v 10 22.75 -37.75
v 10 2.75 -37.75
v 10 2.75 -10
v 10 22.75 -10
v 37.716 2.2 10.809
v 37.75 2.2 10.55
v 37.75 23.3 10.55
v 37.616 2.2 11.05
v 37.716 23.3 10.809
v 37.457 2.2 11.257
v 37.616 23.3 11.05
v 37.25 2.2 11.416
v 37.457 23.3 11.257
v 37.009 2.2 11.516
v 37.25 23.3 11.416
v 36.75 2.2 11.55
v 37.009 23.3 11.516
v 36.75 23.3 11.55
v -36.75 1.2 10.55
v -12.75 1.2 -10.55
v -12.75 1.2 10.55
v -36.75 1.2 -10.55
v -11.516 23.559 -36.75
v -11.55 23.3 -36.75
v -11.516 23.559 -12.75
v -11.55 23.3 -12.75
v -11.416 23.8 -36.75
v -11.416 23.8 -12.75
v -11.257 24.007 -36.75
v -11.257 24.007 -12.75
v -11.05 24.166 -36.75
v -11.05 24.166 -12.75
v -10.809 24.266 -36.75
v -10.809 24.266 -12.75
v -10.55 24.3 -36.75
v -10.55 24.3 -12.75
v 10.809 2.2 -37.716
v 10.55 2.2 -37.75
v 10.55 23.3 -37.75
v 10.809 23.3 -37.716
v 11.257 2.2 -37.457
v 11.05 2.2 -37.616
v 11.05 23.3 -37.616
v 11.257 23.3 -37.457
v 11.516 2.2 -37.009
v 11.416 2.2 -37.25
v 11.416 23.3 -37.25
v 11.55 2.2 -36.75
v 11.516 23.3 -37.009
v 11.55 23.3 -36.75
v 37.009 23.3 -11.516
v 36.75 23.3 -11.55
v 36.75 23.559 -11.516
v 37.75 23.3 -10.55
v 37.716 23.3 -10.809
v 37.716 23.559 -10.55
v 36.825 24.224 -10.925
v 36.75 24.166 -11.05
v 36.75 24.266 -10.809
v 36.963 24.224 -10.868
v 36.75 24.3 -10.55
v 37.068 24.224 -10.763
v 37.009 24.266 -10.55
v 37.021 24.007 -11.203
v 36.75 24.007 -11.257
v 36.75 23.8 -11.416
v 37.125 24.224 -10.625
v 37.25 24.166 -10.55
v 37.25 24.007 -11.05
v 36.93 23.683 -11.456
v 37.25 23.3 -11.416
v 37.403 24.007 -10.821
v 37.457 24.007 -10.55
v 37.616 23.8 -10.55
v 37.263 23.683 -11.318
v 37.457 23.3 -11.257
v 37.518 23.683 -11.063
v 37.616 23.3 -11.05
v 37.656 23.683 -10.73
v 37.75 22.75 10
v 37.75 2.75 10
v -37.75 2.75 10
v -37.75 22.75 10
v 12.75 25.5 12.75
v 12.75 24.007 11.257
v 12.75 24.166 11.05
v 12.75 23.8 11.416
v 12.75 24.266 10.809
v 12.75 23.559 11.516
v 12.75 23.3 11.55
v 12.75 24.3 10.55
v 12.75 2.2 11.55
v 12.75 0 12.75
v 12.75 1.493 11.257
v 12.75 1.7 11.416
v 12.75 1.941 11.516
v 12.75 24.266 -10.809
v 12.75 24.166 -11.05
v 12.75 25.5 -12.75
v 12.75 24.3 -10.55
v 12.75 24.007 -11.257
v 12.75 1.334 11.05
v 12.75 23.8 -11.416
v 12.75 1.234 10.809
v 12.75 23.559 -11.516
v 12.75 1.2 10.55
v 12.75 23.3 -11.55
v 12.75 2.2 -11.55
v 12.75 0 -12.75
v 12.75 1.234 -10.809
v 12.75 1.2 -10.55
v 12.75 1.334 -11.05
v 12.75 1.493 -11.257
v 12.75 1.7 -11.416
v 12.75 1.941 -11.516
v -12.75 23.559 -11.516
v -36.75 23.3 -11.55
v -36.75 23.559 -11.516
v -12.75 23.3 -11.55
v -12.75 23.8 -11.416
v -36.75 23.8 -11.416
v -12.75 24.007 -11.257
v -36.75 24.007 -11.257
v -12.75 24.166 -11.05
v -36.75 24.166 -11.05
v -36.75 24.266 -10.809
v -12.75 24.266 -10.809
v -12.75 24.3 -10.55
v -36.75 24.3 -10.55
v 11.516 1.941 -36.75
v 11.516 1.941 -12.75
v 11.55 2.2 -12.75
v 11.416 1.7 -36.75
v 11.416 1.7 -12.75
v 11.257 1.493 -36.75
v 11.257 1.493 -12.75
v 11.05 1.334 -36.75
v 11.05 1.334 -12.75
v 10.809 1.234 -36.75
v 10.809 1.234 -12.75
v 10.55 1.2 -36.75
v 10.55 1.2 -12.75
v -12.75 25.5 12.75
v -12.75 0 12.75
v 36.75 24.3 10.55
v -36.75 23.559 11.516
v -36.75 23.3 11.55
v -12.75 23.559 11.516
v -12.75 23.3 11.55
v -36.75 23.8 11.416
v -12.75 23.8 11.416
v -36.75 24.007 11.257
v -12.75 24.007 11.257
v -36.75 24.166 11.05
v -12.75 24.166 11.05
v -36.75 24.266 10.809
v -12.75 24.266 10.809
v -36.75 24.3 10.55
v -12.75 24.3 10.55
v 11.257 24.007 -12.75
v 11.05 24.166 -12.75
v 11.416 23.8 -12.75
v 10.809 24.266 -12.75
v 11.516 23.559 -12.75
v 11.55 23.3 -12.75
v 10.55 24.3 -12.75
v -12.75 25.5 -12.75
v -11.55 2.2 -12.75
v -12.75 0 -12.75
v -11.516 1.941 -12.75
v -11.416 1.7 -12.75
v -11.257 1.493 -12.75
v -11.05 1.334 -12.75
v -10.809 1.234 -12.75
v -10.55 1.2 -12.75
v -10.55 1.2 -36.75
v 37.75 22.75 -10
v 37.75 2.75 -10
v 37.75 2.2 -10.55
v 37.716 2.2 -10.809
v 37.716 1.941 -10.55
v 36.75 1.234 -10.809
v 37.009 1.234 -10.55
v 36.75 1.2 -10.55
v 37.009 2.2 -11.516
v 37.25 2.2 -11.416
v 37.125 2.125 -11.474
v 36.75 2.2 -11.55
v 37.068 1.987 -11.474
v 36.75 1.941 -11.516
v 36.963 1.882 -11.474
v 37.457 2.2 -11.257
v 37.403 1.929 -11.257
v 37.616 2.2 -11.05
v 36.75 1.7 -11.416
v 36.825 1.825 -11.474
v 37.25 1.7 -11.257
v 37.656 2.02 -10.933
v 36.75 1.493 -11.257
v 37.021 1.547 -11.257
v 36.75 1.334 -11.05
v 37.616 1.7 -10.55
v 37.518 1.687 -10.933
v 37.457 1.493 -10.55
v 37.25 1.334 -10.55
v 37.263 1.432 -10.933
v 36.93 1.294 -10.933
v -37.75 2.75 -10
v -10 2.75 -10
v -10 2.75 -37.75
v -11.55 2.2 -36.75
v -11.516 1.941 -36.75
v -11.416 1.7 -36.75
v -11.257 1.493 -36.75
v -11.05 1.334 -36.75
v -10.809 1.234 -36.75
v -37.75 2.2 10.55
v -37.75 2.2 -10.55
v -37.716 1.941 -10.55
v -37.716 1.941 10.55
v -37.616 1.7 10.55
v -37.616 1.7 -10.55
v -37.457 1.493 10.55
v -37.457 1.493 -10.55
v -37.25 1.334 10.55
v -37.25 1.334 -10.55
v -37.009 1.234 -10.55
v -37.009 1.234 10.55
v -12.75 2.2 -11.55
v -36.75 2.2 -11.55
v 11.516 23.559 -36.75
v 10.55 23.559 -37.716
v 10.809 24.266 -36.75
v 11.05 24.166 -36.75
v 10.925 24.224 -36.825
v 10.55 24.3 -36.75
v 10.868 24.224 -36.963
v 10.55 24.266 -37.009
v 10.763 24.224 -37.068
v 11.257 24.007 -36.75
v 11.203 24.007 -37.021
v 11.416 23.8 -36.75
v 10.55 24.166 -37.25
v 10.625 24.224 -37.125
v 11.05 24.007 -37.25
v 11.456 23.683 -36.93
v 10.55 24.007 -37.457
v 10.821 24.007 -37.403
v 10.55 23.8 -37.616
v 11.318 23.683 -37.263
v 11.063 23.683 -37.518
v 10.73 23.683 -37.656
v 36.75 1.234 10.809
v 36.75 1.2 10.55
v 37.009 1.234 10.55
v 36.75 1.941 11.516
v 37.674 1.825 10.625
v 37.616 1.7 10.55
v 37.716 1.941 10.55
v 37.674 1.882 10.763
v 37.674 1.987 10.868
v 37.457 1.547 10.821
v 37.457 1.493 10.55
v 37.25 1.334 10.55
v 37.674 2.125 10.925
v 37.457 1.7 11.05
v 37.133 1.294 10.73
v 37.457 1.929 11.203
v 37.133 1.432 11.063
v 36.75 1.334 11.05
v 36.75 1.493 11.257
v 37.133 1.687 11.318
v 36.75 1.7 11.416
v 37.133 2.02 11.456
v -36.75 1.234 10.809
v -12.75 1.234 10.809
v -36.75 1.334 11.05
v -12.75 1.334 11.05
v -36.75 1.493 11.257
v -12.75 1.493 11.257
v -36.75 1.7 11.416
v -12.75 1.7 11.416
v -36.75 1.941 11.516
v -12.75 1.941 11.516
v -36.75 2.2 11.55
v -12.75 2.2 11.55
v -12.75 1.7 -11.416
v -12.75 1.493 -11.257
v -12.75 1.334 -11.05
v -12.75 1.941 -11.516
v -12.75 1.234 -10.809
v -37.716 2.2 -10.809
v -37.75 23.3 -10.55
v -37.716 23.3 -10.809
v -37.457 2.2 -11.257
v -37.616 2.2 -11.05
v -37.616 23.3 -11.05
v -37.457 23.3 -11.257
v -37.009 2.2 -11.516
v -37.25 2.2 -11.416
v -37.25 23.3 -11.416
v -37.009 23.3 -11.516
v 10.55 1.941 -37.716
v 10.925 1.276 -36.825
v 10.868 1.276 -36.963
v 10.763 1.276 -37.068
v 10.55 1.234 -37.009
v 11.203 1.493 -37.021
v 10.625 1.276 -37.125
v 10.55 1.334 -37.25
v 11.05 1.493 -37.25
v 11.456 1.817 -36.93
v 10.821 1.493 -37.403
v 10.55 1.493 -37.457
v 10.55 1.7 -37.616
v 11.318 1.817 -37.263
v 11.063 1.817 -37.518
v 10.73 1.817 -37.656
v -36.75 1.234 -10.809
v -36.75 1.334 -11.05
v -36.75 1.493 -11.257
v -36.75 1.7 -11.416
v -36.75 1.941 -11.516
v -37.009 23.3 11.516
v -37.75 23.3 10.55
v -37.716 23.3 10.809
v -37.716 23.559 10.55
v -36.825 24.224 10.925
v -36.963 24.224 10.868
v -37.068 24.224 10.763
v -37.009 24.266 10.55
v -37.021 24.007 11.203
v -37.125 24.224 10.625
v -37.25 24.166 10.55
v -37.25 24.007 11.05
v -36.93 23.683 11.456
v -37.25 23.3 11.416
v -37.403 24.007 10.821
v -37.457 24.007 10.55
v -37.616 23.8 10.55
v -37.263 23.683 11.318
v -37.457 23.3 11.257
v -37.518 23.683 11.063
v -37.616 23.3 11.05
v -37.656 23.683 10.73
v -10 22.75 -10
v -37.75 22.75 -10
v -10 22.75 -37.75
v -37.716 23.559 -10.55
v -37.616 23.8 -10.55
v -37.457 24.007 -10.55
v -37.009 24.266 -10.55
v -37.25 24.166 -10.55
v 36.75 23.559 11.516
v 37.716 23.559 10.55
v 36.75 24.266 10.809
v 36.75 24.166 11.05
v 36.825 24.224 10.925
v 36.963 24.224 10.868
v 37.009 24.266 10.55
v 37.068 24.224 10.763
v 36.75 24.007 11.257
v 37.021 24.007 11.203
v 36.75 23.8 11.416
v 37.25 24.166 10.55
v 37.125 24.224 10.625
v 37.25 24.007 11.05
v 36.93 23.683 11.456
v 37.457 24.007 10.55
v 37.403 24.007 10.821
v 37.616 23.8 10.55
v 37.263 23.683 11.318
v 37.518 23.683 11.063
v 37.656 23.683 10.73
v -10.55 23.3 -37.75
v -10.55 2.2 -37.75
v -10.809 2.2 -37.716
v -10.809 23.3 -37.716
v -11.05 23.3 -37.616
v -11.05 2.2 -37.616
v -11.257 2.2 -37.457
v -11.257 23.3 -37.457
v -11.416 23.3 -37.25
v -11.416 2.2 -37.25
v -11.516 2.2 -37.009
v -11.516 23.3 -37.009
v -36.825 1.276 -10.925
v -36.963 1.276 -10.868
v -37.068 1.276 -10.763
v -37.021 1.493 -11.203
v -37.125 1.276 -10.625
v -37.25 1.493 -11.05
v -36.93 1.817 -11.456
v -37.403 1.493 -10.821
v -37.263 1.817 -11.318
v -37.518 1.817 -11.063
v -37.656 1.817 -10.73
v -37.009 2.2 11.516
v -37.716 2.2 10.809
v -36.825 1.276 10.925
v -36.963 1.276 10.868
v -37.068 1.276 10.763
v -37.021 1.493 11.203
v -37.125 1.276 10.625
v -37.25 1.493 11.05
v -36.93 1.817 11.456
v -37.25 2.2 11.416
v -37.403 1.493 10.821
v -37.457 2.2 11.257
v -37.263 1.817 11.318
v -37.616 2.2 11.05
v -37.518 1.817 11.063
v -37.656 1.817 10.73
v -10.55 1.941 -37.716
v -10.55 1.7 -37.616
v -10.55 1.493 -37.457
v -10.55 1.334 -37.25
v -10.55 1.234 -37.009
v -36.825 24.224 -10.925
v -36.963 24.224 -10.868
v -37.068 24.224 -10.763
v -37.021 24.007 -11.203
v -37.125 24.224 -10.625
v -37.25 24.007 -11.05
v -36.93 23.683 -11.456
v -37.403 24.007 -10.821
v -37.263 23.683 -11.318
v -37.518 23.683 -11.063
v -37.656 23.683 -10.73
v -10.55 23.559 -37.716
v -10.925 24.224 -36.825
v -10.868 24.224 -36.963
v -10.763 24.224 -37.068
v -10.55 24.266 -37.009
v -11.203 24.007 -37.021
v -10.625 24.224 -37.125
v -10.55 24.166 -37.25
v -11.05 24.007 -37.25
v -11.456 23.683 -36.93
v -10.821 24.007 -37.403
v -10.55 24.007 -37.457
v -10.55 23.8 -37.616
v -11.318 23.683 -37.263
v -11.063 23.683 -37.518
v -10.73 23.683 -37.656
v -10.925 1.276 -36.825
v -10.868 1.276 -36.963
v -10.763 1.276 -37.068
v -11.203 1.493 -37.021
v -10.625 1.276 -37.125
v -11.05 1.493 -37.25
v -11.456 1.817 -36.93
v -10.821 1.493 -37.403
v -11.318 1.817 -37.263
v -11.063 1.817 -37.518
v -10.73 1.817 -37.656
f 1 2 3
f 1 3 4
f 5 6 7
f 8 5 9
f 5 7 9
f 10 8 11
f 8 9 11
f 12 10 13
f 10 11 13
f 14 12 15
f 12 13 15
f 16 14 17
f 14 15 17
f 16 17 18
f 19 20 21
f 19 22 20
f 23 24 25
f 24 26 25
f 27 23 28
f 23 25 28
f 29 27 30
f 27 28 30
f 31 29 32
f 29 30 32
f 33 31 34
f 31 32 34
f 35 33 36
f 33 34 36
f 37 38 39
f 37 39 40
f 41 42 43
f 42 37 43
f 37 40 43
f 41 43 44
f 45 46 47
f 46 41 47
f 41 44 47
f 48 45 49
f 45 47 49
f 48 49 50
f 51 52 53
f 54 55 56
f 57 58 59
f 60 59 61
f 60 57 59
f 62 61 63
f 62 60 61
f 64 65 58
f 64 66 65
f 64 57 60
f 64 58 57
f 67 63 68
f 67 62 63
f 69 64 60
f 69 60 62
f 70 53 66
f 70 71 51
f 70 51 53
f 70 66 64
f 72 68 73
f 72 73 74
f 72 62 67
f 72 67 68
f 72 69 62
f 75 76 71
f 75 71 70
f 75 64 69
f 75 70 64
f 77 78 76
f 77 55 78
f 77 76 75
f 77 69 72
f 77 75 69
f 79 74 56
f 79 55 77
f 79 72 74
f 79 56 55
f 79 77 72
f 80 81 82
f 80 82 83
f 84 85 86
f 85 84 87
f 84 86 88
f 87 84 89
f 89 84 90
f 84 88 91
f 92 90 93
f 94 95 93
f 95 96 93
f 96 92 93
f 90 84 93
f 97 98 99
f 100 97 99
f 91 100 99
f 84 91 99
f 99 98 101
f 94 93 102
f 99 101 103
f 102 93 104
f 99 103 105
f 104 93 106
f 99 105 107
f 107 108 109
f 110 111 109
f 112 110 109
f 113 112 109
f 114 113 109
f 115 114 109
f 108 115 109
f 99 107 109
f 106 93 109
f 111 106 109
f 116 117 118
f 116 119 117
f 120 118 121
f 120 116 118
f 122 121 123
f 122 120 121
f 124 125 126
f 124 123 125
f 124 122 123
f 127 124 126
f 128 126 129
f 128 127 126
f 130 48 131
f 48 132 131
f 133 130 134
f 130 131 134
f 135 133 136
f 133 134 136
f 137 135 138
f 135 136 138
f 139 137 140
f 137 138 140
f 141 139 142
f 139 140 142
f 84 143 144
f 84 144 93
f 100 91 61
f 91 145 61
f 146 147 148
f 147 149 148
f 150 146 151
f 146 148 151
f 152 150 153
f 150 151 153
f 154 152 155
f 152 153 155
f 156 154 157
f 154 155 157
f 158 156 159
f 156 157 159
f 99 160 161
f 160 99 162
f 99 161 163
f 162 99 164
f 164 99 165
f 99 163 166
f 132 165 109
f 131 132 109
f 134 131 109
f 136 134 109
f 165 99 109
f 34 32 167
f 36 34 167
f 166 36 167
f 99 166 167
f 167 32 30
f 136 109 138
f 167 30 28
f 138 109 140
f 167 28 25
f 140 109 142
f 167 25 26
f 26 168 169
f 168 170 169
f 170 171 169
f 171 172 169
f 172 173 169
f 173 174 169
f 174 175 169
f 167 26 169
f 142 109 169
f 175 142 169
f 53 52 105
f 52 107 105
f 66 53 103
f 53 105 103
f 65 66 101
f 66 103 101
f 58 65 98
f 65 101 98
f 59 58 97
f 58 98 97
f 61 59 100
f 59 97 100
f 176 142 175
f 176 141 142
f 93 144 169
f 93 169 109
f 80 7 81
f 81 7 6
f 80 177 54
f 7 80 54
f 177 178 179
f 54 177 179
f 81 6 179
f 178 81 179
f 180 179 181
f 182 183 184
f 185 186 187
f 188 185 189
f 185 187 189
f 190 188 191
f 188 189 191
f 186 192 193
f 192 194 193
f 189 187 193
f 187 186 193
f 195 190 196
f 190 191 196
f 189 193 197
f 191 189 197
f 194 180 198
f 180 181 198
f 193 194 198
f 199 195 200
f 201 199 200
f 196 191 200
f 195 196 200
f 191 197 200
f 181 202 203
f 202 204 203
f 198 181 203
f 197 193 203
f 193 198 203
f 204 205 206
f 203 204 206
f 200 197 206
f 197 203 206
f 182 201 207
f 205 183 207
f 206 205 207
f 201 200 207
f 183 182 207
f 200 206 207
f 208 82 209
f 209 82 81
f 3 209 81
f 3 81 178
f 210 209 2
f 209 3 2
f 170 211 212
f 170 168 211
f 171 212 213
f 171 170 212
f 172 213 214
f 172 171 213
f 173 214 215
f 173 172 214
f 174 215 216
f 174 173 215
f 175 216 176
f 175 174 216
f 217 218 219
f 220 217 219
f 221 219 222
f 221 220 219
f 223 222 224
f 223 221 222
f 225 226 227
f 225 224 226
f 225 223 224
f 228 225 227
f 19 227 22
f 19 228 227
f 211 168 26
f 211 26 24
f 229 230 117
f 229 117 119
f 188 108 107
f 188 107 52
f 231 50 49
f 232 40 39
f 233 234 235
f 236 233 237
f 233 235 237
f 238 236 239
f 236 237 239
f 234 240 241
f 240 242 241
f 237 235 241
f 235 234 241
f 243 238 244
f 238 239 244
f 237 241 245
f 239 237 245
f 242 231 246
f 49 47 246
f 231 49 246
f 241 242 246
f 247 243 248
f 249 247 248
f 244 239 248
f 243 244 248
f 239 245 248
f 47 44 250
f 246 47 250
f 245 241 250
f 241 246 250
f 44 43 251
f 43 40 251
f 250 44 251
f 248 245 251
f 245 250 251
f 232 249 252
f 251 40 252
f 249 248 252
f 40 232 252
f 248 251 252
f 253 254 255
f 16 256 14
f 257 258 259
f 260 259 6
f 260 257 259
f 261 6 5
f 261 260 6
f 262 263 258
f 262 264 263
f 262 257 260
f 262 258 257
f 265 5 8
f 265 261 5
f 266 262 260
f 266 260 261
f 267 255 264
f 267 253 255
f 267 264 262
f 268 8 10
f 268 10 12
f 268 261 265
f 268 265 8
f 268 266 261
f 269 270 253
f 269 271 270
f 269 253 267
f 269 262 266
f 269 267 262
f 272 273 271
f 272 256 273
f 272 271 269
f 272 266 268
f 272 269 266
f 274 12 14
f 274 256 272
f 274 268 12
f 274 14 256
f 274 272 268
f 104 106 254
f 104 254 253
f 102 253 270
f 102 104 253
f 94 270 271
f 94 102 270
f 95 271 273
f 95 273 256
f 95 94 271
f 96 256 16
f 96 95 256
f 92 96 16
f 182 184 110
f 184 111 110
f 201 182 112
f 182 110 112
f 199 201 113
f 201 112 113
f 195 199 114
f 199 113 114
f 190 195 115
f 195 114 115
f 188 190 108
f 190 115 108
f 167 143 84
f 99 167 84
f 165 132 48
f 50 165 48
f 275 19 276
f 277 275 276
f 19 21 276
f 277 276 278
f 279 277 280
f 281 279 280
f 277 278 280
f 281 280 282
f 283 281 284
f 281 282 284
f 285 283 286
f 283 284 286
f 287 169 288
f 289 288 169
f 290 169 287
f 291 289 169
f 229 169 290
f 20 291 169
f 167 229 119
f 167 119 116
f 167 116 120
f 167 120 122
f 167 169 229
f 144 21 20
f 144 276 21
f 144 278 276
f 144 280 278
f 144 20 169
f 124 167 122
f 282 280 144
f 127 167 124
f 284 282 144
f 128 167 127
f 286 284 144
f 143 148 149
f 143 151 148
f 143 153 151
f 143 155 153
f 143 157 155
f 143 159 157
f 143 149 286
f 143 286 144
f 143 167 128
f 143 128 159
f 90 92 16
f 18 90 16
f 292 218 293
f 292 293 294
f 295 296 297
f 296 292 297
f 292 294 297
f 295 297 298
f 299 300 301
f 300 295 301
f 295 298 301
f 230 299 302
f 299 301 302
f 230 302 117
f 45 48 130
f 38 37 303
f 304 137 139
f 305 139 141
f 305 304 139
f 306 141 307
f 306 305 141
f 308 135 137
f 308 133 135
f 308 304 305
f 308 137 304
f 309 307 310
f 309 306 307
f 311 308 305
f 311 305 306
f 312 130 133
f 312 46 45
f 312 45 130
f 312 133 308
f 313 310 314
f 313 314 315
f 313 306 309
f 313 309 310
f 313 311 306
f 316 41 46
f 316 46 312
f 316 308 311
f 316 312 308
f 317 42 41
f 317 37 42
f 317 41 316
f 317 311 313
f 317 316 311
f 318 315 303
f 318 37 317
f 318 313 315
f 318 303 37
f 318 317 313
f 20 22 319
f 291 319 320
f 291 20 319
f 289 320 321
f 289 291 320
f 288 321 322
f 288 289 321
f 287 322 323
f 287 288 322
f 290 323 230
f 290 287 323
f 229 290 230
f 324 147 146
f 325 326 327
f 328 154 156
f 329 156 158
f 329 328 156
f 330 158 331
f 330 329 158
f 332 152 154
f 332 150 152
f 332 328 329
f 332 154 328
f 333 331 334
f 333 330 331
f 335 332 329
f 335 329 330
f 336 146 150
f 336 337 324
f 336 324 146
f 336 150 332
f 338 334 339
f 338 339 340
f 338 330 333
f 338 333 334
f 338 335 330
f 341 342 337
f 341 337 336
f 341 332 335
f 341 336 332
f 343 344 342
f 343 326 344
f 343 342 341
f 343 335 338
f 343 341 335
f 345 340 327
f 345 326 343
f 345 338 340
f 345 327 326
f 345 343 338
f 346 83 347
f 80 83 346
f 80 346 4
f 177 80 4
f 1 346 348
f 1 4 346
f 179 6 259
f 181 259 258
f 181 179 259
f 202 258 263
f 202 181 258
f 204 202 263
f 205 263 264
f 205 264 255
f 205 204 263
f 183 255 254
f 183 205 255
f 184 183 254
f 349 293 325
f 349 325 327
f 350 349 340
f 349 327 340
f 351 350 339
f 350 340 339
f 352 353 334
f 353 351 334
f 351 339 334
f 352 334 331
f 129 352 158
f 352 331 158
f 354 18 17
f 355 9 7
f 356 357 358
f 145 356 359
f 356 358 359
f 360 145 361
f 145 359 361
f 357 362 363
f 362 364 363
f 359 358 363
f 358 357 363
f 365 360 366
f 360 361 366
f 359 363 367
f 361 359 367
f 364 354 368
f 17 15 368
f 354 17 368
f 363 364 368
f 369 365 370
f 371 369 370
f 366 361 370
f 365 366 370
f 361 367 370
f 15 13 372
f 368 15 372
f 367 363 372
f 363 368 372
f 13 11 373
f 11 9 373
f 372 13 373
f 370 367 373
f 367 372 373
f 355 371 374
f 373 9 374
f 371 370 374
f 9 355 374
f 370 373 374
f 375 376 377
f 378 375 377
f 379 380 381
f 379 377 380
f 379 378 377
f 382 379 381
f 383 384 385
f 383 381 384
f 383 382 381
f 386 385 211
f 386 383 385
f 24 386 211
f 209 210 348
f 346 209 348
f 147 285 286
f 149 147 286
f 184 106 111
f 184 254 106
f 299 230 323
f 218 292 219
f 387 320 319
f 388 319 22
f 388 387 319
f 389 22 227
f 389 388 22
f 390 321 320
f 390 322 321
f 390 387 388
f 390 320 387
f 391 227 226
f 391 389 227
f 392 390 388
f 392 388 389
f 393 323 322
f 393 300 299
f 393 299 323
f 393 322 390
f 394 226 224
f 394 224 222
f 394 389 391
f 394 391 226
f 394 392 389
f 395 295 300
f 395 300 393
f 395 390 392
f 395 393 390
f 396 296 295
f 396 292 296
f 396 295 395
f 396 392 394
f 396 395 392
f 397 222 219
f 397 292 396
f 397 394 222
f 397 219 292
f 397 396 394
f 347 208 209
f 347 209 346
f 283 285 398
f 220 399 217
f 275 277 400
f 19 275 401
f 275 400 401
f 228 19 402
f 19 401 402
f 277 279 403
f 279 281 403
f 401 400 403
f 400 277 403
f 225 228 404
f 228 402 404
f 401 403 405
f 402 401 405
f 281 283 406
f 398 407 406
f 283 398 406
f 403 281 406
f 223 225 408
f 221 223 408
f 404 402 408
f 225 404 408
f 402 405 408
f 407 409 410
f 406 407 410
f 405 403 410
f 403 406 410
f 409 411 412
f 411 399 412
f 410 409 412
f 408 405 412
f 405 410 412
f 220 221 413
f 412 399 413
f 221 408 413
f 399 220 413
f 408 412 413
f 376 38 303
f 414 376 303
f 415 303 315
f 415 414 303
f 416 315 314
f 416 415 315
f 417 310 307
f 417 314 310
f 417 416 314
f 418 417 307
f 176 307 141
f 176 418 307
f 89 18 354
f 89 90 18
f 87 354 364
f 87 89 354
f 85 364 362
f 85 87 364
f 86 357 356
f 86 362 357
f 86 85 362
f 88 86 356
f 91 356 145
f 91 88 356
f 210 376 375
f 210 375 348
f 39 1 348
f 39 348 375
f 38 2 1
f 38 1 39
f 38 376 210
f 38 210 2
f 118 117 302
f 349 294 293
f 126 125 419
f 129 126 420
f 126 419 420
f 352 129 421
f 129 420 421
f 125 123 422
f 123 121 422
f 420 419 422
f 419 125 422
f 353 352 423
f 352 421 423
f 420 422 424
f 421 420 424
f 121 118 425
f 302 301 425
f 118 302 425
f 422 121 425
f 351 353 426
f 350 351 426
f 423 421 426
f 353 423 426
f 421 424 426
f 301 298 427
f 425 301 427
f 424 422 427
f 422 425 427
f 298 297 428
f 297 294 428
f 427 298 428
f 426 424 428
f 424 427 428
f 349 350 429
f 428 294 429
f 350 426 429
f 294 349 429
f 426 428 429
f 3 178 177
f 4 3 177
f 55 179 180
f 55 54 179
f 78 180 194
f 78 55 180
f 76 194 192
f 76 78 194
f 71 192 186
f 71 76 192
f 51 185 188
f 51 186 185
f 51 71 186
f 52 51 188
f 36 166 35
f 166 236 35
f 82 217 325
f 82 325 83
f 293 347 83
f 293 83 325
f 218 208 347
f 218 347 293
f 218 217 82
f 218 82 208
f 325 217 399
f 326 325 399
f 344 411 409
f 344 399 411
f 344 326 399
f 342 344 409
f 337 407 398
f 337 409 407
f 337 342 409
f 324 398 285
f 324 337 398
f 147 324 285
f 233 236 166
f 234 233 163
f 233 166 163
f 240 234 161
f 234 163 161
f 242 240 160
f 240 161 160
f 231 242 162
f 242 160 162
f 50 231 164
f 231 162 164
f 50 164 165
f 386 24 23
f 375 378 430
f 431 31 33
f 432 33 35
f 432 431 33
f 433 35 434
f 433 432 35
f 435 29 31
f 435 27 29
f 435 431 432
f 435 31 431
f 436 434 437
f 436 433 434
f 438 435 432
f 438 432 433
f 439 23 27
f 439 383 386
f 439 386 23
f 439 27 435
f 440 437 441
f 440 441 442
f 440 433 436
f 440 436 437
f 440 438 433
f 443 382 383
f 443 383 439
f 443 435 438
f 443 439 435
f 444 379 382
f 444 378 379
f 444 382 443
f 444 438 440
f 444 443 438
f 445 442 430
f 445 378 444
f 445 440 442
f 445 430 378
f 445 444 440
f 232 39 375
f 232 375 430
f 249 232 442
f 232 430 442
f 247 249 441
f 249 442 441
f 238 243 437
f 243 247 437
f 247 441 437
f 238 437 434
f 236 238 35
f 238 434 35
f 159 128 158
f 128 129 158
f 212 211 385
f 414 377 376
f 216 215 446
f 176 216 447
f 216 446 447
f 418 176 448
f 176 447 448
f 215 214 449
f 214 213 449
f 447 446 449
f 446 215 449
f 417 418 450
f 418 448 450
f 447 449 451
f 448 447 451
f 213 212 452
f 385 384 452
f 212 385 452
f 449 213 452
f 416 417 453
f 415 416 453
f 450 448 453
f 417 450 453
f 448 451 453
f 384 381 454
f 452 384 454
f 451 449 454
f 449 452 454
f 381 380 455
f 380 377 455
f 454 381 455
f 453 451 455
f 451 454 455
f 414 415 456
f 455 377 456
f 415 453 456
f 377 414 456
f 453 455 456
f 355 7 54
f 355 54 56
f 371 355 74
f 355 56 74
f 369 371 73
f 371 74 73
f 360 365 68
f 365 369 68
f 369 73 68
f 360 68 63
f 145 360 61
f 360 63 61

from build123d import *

# Parameters (mm, degrees)
SKETCH1_W           = 25
SKETCH1_H           = 23.1
SKETCH1_W_2         = 23.1
SKETCH1_H_2         = 25
BOSS_EXTRUDE2_DEPTH = 25.5
SKETCH2_W           = 23.1
SKETCH2_H           = 1.2
CUT_EXTRUDE1_DEPTH  = 25
SKETCH3_W           = 23.1
SKETCH3_H           = 1.2
CUT_EXTRUDE2_DEPTH  = 25
SKETCH4_W           = 23.1
SKETCH4_H           = 1.2
CUT_EXTRUDE3_DEPTH  = 25
SKETCH5_W           = 20
SKETCH5_H           = 20
CUT_EXTRUDE4_DEPTH  = 76.5
SKETCH8_W           = 20
SKETCH8_H           = 20
CUT_EXTRUDE5_DEPTH  = 30
FILLET1_R           = 1


with BuildPart() as part:
    # Sketch1 → Boss-Extrude2 (new body)
    with BuildSketch(Plane(origin=(0, 0, 0), x_dir=(1, 0, 0), z_dir=(0, 1, 0))):
        with Locations((-25.25, 0)):
            Rectangle(SKETCH1_W, SKETCH1_H)
        Polygon((11.55, 12.75), (-11.55, 12.75), (-12.75, 12.75), (-12.75, 11.55), (-12.75, -11.55), (-12.75, -12.75), (12.75, -12.75), (12.75, -11.55), (12.75, 11.55), (12.75, 12.75), align=None)
        with Locations((0, 25.25)):
            Rectangle(SKETCH1_W_2, SKETCH1_H_2)
        with Locations((25.25, 0)):
            Rectangle(SKETCH1_W, SKETCH1_H)
    extrude(amount=BOSS_EXTRUDE2_DEPTH)

    # Sketch2 → Cut-Extrude1 (cut)
    with BuildSketch(Plane(origin=(37.75, 0, 0), x_dir=(0, 0, -1), z_dir=(1, 0, 0))):
        with Locations((0, 24.9)):
            Rectangle(SKETCH2_W, SKETCH2_H)
        with Locations((0, 0.6)):
            Rectangle(SKETCH2_W, SKETCH2_H)
    extrude(amount=-CUT_EXTRUDE1_DEPTH, mode=Mode.SUBTRACT)

    # Sketch3 → Cut-Extrude2 (cut)
    with BuildSketch(Plane.ZY.offset(37.75)):
        with Locations((0, 24.9)):
            Rectangle(SKETCH3_W, SKETCH3_H)
        with Locations((0, 0.6)):
            Rectangle(SKETCH3_W, SKETCH3_H)
    extrude(amount=-CUT_EXTRUDE2_DEPTH, mode=Mode.SUBTRACT)

    # Sketch4 → Cut-Extrude3 (cut)
    with BuildSketch(Plane(origin=(0, 0, -37.75), x_dir=(-1, 0, 0), z_dir=(0, 0, -1))):
        with Locations((0, 24.9)):
            Rectangle(SKETCH4_W, SKETCH4_H)
        with Locations((0, 0.6)):
            Rectangle(SKETCH4_W, SKETCH4_H)
    extrude(amount=-CUT_EXTRUDE3_DEPTH, mode=Mode.SUBTRACT)

    # Sketch5 → Cut-Extrude4 (cut, through all)
    with BuildSketch(Plane(origin=(37.75, 0, 0), x_dir=(0, 0, -1), z_dir=(1, 0, 0))):
        with Locations((0, 12.75)):
            Rectangle(SKETCH5_W, SKETCH5_H)
    extrude(amount=-CUT_EXTRUDE4_DEPTH, mode=Mode.SUBTRACT)

    # Sketch8 → Cut-Extrude5 (cut)
    with BuildSketch(Plane(origin=(0, 0, -37.75), x_dir=(-1, 0, 0), z_dir=(0, 0, -1))):
        with Locations((0, 12.75)):
            Rectangle(SKETCH8_W, SKETCH8_H)
    extrude(amount=-CUT_EXTRUDE5_DEPTH, mode=Mode.SUBTRACT)

    # Fillet1
    fillet1_edges = [part.edges().sort_by_distance(p)[0] for p in [
        (25.25, 1.2, 11.55),
        (37.75, 1.2, 0),
        (-37.75, 12.75, 11.55),
        (-37.75, 12.75, -11.55),
        (-25.25, 24.3, -11.55),
        (-25.25, 24.3, 11.55),
        (-37.75, 24.3, 0),
        (-25.25, 1.2, 11.55),
        (-25.25, 1.2, -11.55),
        (-37.75, 1.2, 0),
        (-11.55, 12.75, -37.75),
        (11.55, 12.75, -37.75),
        (11.55, 24.3, -25.25),
        (-11.55, 24.3, -25.25),
        (0, 24.3, -37.75),
        (-11.55, 1.2, -25.25),
        (11.55, 1.2, -25.25),
        (0, 1.2, -37.75),
        (37.75, 12.75, -11.55),
        (37.75, 12.75, 11.55),
        (25.25, 24.3, 11.55),
        (25.25, 24.3, -11.55),
        (37.75, 24.3, 0),
        (25.25, 1.2, -11.55),
    ]]
    fillet(fillet1_edges, radius=FILLET1_R)


solid = part.part
